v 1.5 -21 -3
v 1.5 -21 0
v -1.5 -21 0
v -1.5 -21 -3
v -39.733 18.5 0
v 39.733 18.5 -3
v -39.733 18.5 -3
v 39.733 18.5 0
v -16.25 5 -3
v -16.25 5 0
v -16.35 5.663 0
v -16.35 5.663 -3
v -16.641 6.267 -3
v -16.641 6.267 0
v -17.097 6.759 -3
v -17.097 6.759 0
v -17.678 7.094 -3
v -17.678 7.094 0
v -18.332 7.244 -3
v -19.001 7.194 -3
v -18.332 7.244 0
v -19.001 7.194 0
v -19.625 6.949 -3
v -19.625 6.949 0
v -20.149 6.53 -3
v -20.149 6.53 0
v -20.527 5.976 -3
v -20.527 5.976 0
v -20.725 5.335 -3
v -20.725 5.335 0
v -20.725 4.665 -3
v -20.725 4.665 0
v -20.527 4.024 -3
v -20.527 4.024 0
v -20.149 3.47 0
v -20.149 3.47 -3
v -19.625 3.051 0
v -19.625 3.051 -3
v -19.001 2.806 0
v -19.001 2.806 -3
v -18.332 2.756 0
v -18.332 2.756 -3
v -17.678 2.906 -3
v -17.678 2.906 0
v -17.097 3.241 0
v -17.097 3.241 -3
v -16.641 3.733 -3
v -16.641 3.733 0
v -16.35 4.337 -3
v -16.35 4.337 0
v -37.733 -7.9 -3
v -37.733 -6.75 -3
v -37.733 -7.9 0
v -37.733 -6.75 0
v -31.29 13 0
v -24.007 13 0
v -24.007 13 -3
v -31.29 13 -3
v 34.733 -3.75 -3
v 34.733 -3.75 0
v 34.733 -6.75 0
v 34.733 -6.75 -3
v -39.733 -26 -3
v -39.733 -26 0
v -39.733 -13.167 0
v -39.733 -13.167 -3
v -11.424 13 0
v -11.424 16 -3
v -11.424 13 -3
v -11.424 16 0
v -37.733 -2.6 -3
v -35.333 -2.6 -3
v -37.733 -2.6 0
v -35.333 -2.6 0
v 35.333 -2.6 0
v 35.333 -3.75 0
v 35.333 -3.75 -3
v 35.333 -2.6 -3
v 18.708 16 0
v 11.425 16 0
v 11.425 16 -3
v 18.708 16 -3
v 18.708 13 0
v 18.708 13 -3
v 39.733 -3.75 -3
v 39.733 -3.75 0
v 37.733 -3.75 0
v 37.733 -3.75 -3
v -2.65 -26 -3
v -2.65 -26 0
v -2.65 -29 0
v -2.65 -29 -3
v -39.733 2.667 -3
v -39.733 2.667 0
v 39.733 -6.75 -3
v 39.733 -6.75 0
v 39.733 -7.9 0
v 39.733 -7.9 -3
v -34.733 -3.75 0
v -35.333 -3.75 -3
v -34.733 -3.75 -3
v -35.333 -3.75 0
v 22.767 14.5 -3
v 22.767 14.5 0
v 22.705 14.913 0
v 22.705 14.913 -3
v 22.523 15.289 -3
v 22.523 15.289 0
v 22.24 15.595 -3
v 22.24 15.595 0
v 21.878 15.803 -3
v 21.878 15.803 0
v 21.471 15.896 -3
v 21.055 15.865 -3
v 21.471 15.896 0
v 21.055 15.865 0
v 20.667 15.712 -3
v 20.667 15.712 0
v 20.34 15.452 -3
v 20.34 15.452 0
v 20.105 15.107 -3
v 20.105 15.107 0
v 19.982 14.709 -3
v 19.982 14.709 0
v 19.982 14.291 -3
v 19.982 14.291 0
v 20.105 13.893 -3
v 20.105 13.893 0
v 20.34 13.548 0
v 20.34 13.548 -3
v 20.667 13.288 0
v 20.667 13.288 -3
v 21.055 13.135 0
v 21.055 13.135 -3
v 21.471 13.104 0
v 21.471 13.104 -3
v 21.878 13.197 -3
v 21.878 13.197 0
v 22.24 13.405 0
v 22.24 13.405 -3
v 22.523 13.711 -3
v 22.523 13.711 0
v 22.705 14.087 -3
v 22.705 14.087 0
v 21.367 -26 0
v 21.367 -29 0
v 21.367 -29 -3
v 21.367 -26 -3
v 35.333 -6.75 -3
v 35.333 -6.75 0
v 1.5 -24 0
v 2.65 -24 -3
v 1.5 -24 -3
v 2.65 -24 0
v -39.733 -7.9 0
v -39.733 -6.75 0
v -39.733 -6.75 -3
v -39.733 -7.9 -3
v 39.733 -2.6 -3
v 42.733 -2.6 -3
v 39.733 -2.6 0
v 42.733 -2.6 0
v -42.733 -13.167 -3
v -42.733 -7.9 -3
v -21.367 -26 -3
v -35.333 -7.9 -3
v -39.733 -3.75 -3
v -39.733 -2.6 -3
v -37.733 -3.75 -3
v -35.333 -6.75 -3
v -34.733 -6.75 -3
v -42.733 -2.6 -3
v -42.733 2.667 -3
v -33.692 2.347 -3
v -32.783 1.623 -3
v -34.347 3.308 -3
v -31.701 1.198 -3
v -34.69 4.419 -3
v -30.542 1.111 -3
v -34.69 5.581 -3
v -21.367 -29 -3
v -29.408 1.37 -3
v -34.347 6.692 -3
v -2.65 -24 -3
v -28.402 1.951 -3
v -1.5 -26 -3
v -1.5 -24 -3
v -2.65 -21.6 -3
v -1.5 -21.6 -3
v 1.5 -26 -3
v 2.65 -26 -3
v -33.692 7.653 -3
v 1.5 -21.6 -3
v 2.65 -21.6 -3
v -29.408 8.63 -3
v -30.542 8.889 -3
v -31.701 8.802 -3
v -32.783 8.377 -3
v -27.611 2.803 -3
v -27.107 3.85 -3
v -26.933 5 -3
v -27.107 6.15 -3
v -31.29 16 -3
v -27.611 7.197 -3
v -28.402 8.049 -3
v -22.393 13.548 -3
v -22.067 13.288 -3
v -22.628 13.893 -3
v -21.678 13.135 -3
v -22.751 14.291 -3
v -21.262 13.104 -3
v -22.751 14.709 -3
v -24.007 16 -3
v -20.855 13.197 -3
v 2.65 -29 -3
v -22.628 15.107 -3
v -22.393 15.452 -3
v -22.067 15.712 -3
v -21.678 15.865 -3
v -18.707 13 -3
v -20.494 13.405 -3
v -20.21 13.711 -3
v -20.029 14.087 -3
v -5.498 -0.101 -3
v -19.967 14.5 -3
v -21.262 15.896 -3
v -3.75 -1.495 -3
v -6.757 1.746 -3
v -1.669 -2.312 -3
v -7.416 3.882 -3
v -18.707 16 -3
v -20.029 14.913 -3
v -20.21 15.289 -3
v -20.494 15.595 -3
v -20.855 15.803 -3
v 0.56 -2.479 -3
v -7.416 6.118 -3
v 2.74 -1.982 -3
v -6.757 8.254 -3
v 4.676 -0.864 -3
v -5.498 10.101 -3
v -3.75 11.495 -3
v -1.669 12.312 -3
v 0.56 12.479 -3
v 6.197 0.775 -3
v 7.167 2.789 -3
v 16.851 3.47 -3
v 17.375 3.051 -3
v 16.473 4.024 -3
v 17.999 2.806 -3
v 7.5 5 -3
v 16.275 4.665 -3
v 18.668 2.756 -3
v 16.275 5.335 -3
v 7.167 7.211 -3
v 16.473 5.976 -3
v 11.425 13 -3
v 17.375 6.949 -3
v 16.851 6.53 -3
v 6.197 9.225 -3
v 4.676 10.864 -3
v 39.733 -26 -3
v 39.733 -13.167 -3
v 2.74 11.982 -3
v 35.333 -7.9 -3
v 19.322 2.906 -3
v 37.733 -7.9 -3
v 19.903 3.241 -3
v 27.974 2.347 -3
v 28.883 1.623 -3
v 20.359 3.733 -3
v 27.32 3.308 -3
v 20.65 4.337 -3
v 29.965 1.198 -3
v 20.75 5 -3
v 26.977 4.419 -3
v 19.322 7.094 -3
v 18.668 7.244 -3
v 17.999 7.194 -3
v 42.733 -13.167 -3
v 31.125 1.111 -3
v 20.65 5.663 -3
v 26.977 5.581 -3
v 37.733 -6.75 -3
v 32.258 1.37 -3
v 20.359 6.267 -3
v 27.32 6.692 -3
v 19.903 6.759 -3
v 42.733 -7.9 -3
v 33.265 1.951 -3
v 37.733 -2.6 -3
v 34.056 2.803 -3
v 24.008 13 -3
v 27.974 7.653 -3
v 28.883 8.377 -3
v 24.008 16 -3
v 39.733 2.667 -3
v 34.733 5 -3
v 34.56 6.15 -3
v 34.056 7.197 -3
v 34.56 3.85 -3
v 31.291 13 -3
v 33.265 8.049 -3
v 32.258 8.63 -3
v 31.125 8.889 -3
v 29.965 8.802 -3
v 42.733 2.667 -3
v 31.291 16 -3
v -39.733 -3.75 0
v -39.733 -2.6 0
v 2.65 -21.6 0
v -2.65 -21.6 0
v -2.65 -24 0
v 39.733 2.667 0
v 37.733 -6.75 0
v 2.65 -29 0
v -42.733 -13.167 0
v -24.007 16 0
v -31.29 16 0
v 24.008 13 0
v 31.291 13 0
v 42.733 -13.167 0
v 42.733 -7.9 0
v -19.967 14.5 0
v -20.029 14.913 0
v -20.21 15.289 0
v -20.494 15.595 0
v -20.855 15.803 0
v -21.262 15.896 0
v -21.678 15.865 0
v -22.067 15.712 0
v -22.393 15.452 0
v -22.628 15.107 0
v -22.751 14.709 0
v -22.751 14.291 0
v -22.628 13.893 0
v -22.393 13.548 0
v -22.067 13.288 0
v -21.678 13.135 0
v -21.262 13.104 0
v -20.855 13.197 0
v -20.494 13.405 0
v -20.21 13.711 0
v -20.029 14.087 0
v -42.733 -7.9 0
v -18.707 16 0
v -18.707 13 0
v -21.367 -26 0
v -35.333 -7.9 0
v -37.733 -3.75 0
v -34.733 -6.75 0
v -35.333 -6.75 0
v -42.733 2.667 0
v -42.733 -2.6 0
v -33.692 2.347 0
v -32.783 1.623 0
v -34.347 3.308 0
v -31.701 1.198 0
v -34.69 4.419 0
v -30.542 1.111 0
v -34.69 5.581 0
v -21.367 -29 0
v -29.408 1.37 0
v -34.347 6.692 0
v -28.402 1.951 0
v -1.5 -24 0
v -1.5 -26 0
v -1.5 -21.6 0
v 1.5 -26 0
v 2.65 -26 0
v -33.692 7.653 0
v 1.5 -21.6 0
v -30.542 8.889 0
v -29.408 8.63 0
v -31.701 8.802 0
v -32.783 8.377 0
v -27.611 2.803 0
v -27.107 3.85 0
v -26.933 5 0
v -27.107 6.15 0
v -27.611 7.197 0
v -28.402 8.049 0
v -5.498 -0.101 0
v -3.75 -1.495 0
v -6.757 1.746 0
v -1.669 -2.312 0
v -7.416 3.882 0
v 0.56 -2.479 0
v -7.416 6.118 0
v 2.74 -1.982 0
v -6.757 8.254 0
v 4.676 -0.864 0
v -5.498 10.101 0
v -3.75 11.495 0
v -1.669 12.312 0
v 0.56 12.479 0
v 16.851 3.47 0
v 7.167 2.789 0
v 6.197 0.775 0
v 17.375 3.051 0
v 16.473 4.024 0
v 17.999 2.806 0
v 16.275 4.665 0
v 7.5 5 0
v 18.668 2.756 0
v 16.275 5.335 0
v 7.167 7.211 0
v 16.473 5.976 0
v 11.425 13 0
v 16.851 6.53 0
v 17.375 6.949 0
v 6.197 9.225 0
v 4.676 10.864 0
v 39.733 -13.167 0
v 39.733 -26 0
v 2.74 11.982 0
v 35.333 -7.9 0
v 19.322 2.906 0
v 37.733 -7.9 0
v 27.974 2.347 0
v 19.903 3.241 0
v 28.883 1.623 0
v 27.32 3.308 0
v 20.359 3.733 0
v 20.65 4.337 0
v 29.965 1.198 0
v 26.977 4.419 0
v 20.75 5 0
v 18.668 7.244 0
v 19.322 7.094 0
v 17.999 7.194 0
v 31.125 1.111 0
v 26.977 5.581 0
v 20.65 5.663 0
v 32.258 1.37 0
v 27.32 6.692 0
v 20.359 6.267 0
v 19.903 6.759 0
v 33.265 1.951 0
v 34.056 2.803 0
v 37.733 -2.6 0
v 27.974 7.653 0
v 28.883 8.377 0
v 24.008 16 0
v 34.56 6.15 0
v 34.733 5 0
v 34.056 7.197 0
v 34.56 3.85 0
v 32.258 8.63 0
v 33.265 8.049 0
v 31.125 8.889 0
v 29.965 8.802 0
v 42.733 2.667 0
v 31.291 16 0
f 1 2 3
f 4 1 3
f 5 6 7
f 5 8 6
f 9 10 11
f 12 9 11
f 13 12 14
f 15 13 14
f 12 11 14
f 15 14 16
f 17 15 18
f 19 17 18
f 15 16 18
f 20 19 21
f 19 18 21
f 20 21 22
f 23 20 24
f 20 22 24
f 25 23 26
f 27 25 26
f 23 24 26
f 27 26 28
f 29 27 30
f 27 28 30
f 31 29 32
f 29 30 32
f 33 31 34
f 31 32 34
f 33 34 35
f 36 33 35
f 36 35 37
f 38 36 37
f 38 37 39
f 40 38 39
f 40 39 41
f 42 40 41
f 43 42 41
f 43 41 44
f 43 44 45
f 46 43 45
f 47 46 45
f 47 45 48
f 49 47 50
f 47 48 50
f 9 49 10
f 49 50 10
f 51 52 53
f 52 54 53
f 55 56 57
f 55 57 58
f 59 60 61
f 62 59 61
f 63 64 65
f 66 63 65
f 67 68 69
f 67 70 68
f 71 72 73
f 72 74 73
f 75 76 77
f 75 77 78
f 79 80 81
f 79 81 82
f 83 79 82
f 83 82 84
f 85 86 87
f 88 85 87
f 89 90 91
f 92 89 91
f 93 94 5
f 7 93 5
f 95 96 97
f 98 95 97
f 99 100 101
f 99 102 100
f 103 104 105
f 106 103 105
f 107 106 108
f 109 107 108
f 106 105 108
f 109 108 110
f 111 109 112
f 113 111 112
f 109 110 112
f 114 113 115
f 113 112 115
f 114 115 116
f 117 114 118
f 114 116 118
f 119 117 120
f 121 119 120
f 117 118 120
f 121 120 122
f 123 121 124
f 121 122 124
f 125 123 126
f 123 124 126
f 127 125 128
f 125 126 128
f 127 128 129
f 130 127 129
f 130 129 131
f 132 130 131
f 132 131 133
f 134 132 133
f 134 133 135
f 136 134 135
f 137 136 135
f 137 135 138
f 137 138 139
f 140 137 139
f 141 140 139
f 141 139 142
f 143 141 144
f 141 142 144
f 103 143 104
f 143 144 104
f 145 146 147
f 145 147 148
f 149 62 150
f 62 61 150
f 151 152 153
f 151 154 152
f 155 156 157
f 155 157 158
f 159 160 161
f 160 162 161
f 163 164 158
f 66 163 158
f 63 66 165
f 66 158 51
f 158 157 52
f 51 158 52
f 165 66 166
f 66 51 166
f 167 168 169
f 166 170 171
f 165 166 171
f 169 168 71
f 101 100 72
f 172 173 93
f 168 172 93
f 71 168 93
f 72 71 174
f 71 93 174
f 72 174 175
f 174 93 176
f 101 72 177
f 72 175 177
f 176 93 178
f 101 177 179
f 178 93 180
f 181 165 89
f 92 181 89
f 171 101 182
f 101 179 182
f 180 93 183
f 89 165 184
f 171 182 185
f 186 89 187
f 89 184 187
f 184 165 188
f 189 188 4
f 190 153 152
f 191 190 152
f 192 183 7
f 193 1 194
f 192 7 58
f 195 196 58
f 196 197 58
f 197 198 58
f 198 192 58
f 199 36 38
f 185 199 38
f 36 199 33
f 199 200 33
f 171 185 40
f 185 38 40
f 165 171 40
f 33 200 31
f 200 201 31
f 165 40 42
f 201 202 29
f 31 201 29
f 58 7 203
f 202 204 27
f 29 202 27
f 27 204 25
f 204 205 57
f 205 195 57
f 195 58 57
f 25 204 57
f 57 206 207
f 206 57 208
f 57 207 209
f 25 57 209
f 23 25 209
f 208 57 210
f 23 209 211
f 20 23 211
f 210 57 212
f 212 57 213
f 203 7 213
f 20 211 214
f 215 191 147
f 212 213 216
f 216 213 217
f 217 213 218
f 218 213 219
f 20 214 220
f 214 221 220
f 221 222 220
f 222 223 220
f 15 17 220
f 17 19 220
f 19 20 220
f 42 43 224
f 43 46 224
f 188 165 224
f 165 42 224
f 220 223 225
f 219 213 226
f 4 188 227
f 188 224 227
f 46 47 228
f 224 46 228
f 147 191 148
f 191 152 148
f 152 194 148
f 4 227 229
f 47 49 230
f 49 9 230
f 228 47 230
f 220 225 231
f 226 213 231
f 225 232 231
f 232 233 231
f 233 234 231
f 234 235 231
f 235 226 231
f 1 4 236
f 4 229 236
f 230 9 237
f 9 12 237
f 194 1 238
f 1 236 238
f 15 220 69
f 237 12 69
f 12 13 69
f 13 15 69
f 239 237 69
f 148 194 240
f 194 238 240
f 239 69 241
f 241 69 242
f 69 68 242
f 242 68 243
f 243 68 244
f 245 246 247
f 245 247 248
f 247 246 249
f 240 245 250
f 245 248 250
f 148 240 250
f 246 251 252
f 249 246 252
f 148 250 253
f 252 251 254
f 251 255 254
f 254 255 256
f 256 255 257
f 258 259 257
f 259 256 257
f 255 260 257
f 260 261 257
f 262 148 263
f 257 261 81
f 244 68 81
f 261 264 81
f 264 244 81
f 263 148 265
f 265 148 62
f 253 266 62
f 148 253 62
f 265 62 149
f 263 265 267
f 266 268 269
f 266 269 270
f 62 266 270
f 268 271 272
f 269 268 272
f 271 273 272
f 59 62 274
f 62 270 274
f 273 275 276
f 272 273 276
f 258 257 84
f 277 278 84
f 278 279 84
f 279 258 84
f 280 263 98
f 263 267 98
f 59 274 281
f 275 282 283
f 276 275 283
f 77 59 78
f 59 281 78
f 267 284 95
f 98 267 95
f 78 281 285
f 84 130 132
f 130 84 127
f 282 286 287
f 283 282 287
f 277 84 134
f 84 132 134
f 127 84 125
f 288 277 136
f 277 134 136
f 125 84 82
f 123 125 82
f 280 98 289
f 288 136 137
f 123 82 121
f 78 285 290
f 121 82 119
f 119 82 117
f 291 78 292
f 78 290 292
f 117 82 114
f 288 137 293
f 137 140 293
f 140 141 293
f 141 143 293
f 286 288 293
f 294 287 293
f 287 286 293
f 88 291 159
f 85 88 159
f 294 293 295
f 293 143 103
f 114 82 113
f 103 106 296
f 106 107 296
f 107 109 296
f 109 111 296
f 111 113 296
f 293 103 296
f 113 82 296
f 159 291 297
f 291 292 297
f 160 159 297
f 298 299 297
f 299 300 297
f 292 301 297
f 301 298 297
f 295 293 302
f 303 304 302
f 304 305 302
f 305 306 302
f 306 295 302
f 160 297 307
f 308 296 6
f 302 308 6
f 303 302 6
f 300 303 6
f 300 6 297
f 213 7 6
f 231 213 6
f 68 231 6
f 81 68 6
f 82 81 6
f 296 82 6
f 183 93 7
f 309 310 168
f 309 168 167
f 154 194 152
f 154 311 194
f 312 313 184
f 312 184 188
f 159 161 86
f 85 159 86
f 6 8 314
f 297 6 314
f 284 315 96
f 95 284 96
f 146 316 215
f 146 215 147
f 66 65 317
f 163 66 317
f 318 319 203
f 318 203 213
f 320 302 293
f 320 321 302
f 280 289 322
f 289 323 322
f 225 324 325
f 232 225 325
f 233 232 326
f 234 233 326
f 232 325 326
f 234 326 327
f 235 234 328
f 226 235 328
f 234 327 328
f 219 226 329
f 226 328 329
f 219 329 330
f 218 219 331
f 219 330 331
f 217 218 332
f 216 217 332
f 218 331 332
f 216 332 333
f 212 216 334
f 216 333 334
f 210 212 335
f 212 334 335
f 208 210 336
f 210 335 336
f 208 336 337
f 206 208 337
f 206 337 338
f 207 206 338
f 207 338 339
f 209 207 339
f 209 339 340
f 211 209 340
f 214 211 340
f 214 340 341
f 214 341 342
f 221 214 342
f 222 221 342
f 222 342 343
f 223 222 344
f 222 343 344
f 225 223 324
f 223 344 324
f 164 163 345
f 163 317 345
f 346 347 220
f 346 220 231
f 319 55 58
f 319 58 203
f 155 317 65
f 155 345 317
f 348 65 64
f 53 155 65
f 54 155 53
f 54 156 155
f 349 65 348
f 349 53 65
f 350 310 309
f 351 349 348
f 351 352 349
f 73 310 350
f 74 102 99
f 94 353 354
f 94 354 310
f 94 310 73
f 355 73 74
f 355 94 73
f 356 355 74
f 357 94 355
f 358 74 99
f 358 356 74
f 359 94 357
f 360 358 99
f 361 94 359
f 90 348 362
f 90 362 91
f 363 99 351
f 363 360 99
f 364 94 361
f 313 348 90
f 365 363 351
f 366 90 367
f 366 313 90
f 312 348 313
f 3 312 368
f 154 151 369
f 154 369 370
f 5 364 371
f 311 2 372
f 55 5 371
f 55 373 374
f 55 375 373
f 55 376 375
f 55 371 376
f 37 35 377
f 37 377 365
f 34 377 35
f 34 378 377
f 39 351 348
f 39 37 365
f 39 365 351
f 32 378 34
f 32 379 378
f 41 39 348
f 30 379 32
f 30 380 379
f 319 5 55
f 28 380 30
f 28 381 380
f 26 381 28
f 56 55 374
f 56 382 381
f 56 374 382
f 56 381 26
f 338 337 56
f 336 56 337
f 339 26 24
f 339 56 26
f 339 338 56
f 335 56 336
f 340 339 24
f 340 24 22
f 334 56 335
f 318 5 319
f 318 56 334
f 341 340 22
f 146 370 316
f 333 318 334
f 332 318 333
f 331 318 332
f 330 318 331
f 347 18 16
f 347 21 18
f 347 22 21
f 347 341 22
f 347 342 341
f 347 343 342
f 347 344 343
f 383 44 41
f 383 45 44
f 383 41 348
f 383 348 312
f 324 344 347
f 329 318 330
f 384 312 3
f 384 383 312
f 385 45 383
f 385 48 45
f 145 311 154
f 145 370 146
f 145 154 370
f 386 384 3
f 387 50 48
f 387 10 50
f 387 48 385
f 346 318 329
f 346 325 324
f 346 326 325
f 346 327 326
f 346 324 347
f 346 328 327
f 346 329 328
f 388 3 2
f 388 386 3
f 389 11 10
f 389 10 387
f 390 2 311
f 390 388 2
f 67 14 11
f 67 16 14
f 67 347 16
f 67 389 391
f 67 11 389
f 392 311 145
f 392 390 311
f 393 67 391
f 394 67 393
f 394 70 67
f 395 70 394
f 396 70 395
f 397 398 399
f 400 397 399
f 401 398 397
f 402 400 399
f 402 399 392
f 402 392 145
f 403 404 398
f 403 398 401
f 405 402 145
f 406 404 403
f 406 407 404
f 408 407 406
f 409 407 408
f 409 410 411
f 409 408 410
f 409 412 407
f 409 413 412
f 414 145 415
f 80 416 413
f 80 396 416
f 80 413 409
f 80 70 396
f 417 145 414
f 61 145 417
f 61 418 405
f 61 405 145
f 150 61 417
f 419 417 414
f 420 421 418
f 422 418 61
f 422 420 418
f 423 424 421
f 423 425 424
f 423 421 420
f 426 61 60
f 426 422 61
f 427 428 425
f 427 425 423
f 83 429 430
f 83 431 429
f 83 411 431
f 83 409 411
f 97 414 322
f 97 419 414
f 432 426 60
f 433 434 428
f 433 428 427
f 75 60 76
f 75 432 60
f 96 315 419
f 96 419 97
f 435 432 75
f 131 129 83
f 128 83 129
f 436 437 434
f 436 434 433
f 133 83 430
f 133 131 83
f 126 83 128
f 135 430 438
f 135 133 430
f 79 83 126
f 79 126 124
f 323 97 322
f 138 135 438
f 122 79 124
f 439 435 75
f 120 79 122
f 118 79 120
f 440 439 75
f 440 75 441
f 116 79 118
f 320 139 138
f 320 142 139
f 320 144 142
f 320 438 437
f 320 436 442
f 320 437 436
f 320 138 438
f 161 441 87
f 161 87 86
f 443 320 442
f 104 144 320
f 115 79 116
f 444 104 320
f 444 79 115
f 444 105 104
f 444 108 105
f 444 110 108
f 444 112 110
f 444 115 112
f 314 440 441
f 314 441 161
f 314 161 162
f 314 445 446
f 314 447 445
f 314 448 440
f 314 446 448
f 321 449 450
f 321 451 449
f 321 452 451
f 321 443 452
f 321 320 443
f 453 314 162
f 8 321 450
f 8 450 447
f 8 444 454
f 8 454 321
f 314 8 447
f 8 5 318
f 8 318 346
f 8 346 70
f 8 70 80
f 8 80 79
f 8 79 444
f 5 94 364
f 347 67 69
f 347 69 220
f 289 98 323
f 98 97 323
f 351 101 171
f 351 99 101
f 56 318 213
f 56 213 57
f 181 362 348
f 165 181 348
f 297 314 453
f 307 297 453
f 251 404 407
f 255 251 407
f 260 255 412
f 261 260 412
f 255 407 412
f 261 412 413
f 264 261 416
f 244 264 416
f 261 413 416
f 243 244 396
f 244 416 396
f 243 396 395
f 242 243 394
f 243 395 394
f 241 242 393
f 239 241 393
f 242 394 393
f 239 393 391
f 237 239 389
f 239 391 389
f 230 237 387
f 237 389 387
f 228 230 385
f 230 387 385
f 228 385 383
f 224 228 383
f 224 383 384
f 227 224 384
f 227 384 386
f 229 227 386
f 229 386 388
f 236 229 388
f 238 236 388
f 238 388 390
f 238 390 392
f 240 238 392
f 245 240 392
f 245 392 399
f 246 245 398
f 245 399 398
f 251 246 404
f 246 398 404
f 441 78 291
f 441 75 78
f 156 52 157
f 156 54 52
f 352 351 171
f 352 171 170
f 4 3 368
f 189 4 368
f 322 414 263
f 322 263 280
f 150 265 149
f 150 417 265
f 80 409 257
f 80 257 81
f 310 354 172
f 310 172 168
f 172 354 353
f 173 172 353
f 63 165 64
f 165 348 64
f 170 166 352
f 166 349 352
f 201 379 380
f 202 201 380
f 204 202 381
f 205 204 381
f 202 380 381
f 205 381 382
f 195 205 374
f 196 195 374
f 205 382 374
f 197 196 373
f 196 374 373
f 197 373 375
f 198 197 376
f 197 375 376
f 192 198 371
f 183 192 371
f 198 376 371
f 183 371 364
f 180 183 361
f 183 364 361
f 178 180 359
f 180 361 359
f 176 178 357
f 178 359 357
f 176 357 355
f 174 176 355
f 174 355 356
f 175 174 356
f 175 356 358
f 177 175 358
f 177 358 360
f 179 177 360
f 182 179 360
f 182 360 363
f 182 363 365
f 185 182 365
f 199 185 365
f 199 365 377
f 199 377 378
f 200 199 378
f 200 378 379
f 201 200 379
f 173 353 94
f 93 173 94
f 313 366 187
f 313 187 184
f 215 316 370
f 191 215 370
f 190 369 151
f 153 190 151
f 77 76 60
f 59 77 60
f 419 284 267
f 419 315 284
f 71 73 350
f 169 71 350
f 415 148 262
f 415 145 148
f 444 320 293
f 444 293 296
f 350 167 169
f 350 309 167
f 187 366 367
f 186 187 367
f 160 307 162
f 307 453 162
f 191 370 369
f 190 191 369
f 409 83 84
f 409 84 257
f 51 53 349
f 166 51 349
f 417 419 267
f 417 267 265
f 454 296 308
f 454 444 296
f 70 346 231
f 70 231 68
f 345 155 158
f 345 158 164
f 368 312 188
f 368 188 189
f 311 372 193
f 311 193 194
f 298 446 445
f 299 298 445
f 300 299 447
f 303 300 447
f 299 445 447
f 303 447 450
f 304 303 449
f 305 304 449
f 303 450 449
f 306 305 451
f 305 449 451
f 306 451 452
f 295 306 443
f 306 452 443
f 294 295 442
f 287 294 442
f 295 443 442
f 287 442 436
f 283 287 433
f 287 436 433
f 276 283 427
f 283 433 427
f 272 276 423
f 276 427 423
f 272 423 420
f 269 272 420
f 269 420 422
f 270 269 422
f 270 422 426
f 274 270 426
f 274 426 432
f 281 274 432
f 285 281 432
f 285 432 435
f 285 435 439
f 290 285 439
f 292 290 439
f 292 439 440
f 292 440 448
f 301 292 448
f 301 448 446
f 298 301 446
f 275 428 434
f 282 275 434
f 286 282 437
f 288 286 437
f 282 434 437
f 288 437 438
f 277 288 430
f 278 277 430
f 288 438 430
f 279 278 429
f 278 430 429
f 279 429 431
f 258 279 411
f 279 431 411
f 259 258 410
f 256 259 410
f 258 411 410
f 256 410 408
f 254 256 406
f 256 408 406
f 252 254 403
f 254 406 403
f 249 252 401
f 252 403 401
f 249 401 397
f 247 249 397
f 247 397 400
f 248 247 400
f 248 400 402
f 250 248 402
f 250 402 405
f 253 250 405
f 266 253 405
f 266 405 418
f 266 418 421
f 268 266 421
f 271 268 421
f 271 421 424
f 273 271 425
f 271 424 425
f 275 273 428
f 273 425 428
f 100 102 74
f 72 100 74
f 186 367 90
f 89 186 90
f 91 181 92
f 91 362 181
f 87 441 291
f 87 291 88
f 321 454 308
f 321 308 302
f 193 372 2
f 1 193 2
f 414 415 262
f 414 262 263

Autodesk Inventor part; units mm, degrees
ref_plane "YZ Plane" through (0, 0, 0) normal (1, 0, 0) x (0, 1, 0)
ref_plane "XZ Plane" through (0, 0, 0) normal (0, 1, 0) x (-1, 0, 0)
ref_plane "XY Plane" through (0, 0, 0) normal (0, 0, 1) x (1, 0, 0)
sketch "Sketch1" plane through (0, 0, 0) normal (0, 0, 1) x (1, 0, 0)
  circle A0 centre (0, 5) radius 7.5
  line L0 (42.7333, 18.5) -> (-42.7333, 18.5)
  line L1 (-42.7333, -29) -> (42.7333, -29)
  circle A1 centre (18.5, 5) radius 2.25
  circle A2 centre (-18.5, 5) radius 2.25
  circle A3 centre (30.8333, 5) radius 3.9
  circle A4 centre (-30.8333, 5) radius 3.9
  line L2 (42.7333, 18.5) -> (42.7333, -29)
  line L3 (-42.7333, -29) -> (-42.7333, 18.5)
  circle A5 centre (0, 5) radius 13.5 construction
  line L4 (0, 41.7106) -> (0, -39.2634) construction
  dimension "d2" = 4.5
  dimension "d3" = 4.5
  dimension "d4" = 7.8
  dimension "d5" = 7.8
  dimension "d48" = 47.5
  dimension "d58" = 15
  dimension "d63" = 27
  dimension "d75" = 34
  dimension "d76" = 30.8333
  dimension "d77" = 85.4667
  dimension "d93" = 47.5
  dimension "d99" = 61.667
extrude "Extrusion1" add sketch "Sketch1" against normal blind 3
sketch "Sketch4" plane through (0, 0, 0) normal (0, 0, 1) x (1, 0, 0)
  line L0 (42.7333, 18.5) -> (39.7333, 18.5)
  line L1 (-42.7333, 18.5) -> (-39.7333, 18.5)
  line L2 (42.7333, -29) -> (21.3667, -29)
  line L3 (21.3667, -26) -> (39.7333, -26)
  line L4 (-42.7333, -29) -> (-21.3667, -29)
  line L5 (-21.3667, -29) -> (-21.3667, -26)
  line L6 (-21.3667, -26) -> (-39.7333, -26)
  line L7 (-42.7333, -23) -> (-42.7333, -29)
  line L8 (42.7333, 18.5) -> (39.7333, 18.5)
  line L9 (39.7333, 18.5) -> (39.7333, 2.6667)
  line L10 (39.7333, 2.6667) -> (42.7333, 2.6667)
  line L11 (42.7333, 2.6667) -> (42.7333, 18.5)
  line L12 (39.7333, -26) -> (39.7333, -13.1667)
  line L13 (39.7333, -13.1667) -> (42.7333, -13.1667)
  line L14 (-42.7333, 2.6667) -> (-39.7333, 2.6667)
  line L15 (-39.7333, 2.6667) -> (-39.7333, 18.5)
  line L16 (-39.7333, 18.5) -> (-42.7333, 18.5)
  line L17 (-42.7333, 18.5) -> (-42.7333, 2.6667)
  line L18 (-42.7333, -29) -> (-39.7333, -29)
  line L19 (-39.7333, -26) -> (-39.7333, -13.1667)
  line L20 (-39.7333, -13.1667) -> (-42.7333, -13.1667)
  line L21 (-42.7333, -13.1667) -> (-42.7333, -29)
  line L22 (21.3667, -29) -> (21.3667, -26)
  line L23 (-21.3667, -23) -> (-21.3667, -29)
  line L24 (-42.7333, 18.5) -> (-39.7333, 18.5)
  line L25 (-42.7333, -29) -> (42.7333, -29) projected
  line L26 (42.7333, 18.5) -> (-42.7333, 18.5) projected
  line L27 (50.1623, -5.25) -> (-50.4474, -5.25) construction
  line L28 (42.7333, -29) -> (42.7333, 18.5) projected
  line L29 (42.7333, -3.75) -> (34.7333, -3.75)
  line L30 (34.7333, -3.75) -> (34.7333, -6.75)
  line L31 (34.7333, -6.75) -> (42.7333, -6.75)
  line L32 (42.7333, -6.75) -> (42.7333, -3.75)
  circle A0 centre (0, 5) radius 13.5 construction
  circle A1 centre (0, 5) radius 7.5
  line L33 (42.7333, -2.6) -> (39.7333, -2.6)
  line L34 (39.7333, -2.6) -> (39.7333, -7.9)
  line L35 (39.7333, -7.9) -> (42.7333, -7.9)
  line L36 (42.7333, -7.9) -> (42.7333, -2.6)
  line L37 (35.3333, -2.6) -> (37.7333, -2.6)
  line L38 (37.7333, -2.6) -> (37.7333, -7.9)
  line L39 (37.7333, -7.9) -> (35.3333, -7.9)
  line L40 (35.3333, -7.9) -> (35.3333, -2.6)
  line L41 (0, 33.7344) -> (0, -36.9537) construction
  line L42 (-42.7333, 18.5) -> (-42.7333, -29) projected
  line L43 (-42.7333, -3.75) -> (-34.7333, -3.75)
  line L44 (-34.7333, -3.75) -> (-34.7333, -6.75)
  line L45 (-34.7333, -6.75) -> (-42.7333, -6.75)
  line L46 (-42.7333, -6.75) -> (-42.7333, -3.75)
  line L47 (-42.7333, -2.6) -> (-39.7333, -2.6)
  line L48 (-39.7333, -2.6) -> (-39.7333, -7.9)
  line L49 (-39.7333, -7.9) -> (-42.7333, -7.9)
  line L50 (-42.7333, -7.9) -> (-42.7333, -2.6)
  line L51 (-35.3333, -2.6) -> (-37.7333, -2.6)
  line L52 (-37.7333, -2.6) -> (-37.7333, -7.9)
  line L53 (-37.7333, -7.9) -> (-35.3333, -7.9)
  line L54 (-35.3333, -7.9) -> (-35.3333, -2.6)
  line L55 (42.7333, -29) -> (-42.7333, -29) projected
  line L56 (-1.5, -29) -> (1.5, -29)
  line L57 (1.5, -29) -> (1.5, -21)
  line L58 (1.5, -21) -> (-1.5, -21)
  line L59 (-1.5, -21) -> (-1.5, -29)
  line L60 (-2.65, -29) -> (2.65, -29)
  line L61 (2.65, -29) -> (2.65, -26)
  line L62 (2.65, -26) -> (-2.65, -26)
  line L63 (-2.65, -26) -> (-2.65, -29)
  line L64 (-2.65, -21.6) -> (2.65, -21.6)
  line L65 (2.65, -21.6) -> (2.65, -24)
  line L66 (2.65, -24) -> (-2.65, -24)
  line L67 (-2.65, -24) -> (-2.65, -21.6)
  line L68 (31.3, 16) -> (24.0167, 16) construction
  line L69 (11.4333, 16) -> (11.4333, 13) construction
  line L70 (11.4333, 13) -> (18.7167, 13) construction
  line L71 (31.3, 13) -> (31.3, 16) construction
  circle A2 centre (30.8333, 5) radius 3.9 projected
  line L72 (21.3667, 17.602) -> (21.3667, 7.8585) construction
  line L73 (18.7167, 16) -> (24.0167, 16) construction
  line L74 (24.0167, 16) -> (24.0167, 13) construction
  line L75 (24.0167, 13) -> (18.7167, 13) construction
  line L76 (18.7167, 13) -> (18.7167, 16) construction
  line L77 (18.7167, 16) -> (11.4333, 16) construction
  line L78 (24.0167, 13) -> (31.3, 13) construction
  circle A3 centre (21.3667, 14.5) radius 1.4
  line L79 (-31.3, 16) -> (-24.0167, 16) construction
  line L80 (-11.4333, 16) -> (-11.4333, 13) construction
  line L81 (-11.4333, 13) -> (-18.7167, 13) construction
  line L82 (-31.3, 13) -> (-31.3, 16) construction
  line L83 (-24.0167, 16) -> (-24.0167, 13) construction
  line L84 (-18.7167, 13) -> (-18.7167, 16) construction
  line L85 (-18.7167, 16) -> (-11.4333, 16) construction
  line L86 (-24.0167, 13) -> (-31.3, 13) construction
  circle A4 centre (-21.3667, 14.5) radius 1.4
  line L87 (42.7333, 18.5) -> (42.7333, -29) projected
  line L88 (42.7333, -13.1667) -> (42.7333, -29)
  line L89 (11.4247, 13) -> (11.4247, 16)
  line L90 (11.4247, 16) -> (18.7077, 16)
  line L91 (18.7077, 16) -> (18.7077, 13)
  line L92 (18.7077, 13) -> (11.4247, 13)
  line L93 (31.2907, 16) -> (31.2907, 13)
  line L94 (31.2907, 13) -> (24.0077, 13)
  line L95 (24.0077, 13) -> (24.0077, 16)
  line L96 (24.0077, 16) -> (31.2907, 16)
  line L97 (-18.7073, 13) -> (-18.7073, 16)
  line L98 (-18.7073, 16) -> (-11.4243, 16)
  line L99 (-11.4243, 16) -> (-11.4243, 13)
  line L100 (-11.4243, 13) -> (-18.7073, 13)
  line L101 (-24.0073, 16) -> (-24.0073, 13)
  line L102 (-24.0073, 13) -> (-31.2903, 13)
  line L103 (-31.2903, 13) -> (-31.2903, 16)
  line L104 (-31.2903, 16) -> (-24.0073, 16)
  dimension "d25" = 3
  dimension "d26" = 3
  dimension "d33" = 15.8333
  dimension "d59" = 8
  dimension "d60" = 3
  dimension "d61" = 47.5
  dimension "d62" = 27
  dimension "d65" = 5.3
  dimension "d66" = 2.4
  dimension "d68" = 5
  dimension "d69" = 3
  dimension "d70" = 8
  dimension "d71" = 5.3
  dimension "d74" = 5
  dimension "d78" = 3
  dimension "d81" = 3
  dimension "d82" = 11
  dimension "d83" = 19.8667
  dimension "d85" = 79.4667
  dimension "d86" = 85.4667
  dimension "d87" = 3
  dimension "d88" = 5.3
  dimension "d89" = 2.8
  dimension "d91" = 15.8333
  dimension "d92" = 21.3667
  dimension "d94" = 2.4
  dimension "d95" = 2.4
  dimension "d96" = 11.4333
  dimension "d97" = 7.2833
  dimension "d98" = 2.65
extrude "Extrusion2" cut sketch "Sketch4" against normal through all contours L11 L10 L9 L0 | L15 L14 L17 L1 | L28 L29 L34 L33 | L28 L31 L34 L29 | L28 L35 L34 L31 | L34 L31 L38 L29 | L47 L48 L43 L42 | L38 L31 L40 L29 | L29 L40 L37 L38 | L43 L48 L45 L42 | L28 L2 L22 L3 L12 L13 | L38 L39 L40 L31 | L40 L31 L30 L29 | L45 L48 L49 L42 | L43 L52 L45 L48 | L52 L51 L54 L43 | L43 L54 L45 L52 | L20 L19 L6 L5 L4 L7 L21 | L45 L54 L53 L52 | L43 L44 L45 L54 | L25 L57 L62 L61 | L25 L59 L62 L57 | L25 L63 L62 L59 | L62 L59 L66 L57 | L66 L59 L64 L57 | L57 L64 L65 L66 | L66 L67 L64 L59 | L64 L59 L58 L57 | A1 | A3 | A4 | L89 L90 L91 L92 | L93 L94 L95 L96 | L97 L98 L99 L100 | L101 L102 L103 L104
equation "\"d48\" = d75 + 0.5 * d63"
equation "\"d33\" = 0.333333 * d61"
properties part number "X-Anchor_Front-Outer"
